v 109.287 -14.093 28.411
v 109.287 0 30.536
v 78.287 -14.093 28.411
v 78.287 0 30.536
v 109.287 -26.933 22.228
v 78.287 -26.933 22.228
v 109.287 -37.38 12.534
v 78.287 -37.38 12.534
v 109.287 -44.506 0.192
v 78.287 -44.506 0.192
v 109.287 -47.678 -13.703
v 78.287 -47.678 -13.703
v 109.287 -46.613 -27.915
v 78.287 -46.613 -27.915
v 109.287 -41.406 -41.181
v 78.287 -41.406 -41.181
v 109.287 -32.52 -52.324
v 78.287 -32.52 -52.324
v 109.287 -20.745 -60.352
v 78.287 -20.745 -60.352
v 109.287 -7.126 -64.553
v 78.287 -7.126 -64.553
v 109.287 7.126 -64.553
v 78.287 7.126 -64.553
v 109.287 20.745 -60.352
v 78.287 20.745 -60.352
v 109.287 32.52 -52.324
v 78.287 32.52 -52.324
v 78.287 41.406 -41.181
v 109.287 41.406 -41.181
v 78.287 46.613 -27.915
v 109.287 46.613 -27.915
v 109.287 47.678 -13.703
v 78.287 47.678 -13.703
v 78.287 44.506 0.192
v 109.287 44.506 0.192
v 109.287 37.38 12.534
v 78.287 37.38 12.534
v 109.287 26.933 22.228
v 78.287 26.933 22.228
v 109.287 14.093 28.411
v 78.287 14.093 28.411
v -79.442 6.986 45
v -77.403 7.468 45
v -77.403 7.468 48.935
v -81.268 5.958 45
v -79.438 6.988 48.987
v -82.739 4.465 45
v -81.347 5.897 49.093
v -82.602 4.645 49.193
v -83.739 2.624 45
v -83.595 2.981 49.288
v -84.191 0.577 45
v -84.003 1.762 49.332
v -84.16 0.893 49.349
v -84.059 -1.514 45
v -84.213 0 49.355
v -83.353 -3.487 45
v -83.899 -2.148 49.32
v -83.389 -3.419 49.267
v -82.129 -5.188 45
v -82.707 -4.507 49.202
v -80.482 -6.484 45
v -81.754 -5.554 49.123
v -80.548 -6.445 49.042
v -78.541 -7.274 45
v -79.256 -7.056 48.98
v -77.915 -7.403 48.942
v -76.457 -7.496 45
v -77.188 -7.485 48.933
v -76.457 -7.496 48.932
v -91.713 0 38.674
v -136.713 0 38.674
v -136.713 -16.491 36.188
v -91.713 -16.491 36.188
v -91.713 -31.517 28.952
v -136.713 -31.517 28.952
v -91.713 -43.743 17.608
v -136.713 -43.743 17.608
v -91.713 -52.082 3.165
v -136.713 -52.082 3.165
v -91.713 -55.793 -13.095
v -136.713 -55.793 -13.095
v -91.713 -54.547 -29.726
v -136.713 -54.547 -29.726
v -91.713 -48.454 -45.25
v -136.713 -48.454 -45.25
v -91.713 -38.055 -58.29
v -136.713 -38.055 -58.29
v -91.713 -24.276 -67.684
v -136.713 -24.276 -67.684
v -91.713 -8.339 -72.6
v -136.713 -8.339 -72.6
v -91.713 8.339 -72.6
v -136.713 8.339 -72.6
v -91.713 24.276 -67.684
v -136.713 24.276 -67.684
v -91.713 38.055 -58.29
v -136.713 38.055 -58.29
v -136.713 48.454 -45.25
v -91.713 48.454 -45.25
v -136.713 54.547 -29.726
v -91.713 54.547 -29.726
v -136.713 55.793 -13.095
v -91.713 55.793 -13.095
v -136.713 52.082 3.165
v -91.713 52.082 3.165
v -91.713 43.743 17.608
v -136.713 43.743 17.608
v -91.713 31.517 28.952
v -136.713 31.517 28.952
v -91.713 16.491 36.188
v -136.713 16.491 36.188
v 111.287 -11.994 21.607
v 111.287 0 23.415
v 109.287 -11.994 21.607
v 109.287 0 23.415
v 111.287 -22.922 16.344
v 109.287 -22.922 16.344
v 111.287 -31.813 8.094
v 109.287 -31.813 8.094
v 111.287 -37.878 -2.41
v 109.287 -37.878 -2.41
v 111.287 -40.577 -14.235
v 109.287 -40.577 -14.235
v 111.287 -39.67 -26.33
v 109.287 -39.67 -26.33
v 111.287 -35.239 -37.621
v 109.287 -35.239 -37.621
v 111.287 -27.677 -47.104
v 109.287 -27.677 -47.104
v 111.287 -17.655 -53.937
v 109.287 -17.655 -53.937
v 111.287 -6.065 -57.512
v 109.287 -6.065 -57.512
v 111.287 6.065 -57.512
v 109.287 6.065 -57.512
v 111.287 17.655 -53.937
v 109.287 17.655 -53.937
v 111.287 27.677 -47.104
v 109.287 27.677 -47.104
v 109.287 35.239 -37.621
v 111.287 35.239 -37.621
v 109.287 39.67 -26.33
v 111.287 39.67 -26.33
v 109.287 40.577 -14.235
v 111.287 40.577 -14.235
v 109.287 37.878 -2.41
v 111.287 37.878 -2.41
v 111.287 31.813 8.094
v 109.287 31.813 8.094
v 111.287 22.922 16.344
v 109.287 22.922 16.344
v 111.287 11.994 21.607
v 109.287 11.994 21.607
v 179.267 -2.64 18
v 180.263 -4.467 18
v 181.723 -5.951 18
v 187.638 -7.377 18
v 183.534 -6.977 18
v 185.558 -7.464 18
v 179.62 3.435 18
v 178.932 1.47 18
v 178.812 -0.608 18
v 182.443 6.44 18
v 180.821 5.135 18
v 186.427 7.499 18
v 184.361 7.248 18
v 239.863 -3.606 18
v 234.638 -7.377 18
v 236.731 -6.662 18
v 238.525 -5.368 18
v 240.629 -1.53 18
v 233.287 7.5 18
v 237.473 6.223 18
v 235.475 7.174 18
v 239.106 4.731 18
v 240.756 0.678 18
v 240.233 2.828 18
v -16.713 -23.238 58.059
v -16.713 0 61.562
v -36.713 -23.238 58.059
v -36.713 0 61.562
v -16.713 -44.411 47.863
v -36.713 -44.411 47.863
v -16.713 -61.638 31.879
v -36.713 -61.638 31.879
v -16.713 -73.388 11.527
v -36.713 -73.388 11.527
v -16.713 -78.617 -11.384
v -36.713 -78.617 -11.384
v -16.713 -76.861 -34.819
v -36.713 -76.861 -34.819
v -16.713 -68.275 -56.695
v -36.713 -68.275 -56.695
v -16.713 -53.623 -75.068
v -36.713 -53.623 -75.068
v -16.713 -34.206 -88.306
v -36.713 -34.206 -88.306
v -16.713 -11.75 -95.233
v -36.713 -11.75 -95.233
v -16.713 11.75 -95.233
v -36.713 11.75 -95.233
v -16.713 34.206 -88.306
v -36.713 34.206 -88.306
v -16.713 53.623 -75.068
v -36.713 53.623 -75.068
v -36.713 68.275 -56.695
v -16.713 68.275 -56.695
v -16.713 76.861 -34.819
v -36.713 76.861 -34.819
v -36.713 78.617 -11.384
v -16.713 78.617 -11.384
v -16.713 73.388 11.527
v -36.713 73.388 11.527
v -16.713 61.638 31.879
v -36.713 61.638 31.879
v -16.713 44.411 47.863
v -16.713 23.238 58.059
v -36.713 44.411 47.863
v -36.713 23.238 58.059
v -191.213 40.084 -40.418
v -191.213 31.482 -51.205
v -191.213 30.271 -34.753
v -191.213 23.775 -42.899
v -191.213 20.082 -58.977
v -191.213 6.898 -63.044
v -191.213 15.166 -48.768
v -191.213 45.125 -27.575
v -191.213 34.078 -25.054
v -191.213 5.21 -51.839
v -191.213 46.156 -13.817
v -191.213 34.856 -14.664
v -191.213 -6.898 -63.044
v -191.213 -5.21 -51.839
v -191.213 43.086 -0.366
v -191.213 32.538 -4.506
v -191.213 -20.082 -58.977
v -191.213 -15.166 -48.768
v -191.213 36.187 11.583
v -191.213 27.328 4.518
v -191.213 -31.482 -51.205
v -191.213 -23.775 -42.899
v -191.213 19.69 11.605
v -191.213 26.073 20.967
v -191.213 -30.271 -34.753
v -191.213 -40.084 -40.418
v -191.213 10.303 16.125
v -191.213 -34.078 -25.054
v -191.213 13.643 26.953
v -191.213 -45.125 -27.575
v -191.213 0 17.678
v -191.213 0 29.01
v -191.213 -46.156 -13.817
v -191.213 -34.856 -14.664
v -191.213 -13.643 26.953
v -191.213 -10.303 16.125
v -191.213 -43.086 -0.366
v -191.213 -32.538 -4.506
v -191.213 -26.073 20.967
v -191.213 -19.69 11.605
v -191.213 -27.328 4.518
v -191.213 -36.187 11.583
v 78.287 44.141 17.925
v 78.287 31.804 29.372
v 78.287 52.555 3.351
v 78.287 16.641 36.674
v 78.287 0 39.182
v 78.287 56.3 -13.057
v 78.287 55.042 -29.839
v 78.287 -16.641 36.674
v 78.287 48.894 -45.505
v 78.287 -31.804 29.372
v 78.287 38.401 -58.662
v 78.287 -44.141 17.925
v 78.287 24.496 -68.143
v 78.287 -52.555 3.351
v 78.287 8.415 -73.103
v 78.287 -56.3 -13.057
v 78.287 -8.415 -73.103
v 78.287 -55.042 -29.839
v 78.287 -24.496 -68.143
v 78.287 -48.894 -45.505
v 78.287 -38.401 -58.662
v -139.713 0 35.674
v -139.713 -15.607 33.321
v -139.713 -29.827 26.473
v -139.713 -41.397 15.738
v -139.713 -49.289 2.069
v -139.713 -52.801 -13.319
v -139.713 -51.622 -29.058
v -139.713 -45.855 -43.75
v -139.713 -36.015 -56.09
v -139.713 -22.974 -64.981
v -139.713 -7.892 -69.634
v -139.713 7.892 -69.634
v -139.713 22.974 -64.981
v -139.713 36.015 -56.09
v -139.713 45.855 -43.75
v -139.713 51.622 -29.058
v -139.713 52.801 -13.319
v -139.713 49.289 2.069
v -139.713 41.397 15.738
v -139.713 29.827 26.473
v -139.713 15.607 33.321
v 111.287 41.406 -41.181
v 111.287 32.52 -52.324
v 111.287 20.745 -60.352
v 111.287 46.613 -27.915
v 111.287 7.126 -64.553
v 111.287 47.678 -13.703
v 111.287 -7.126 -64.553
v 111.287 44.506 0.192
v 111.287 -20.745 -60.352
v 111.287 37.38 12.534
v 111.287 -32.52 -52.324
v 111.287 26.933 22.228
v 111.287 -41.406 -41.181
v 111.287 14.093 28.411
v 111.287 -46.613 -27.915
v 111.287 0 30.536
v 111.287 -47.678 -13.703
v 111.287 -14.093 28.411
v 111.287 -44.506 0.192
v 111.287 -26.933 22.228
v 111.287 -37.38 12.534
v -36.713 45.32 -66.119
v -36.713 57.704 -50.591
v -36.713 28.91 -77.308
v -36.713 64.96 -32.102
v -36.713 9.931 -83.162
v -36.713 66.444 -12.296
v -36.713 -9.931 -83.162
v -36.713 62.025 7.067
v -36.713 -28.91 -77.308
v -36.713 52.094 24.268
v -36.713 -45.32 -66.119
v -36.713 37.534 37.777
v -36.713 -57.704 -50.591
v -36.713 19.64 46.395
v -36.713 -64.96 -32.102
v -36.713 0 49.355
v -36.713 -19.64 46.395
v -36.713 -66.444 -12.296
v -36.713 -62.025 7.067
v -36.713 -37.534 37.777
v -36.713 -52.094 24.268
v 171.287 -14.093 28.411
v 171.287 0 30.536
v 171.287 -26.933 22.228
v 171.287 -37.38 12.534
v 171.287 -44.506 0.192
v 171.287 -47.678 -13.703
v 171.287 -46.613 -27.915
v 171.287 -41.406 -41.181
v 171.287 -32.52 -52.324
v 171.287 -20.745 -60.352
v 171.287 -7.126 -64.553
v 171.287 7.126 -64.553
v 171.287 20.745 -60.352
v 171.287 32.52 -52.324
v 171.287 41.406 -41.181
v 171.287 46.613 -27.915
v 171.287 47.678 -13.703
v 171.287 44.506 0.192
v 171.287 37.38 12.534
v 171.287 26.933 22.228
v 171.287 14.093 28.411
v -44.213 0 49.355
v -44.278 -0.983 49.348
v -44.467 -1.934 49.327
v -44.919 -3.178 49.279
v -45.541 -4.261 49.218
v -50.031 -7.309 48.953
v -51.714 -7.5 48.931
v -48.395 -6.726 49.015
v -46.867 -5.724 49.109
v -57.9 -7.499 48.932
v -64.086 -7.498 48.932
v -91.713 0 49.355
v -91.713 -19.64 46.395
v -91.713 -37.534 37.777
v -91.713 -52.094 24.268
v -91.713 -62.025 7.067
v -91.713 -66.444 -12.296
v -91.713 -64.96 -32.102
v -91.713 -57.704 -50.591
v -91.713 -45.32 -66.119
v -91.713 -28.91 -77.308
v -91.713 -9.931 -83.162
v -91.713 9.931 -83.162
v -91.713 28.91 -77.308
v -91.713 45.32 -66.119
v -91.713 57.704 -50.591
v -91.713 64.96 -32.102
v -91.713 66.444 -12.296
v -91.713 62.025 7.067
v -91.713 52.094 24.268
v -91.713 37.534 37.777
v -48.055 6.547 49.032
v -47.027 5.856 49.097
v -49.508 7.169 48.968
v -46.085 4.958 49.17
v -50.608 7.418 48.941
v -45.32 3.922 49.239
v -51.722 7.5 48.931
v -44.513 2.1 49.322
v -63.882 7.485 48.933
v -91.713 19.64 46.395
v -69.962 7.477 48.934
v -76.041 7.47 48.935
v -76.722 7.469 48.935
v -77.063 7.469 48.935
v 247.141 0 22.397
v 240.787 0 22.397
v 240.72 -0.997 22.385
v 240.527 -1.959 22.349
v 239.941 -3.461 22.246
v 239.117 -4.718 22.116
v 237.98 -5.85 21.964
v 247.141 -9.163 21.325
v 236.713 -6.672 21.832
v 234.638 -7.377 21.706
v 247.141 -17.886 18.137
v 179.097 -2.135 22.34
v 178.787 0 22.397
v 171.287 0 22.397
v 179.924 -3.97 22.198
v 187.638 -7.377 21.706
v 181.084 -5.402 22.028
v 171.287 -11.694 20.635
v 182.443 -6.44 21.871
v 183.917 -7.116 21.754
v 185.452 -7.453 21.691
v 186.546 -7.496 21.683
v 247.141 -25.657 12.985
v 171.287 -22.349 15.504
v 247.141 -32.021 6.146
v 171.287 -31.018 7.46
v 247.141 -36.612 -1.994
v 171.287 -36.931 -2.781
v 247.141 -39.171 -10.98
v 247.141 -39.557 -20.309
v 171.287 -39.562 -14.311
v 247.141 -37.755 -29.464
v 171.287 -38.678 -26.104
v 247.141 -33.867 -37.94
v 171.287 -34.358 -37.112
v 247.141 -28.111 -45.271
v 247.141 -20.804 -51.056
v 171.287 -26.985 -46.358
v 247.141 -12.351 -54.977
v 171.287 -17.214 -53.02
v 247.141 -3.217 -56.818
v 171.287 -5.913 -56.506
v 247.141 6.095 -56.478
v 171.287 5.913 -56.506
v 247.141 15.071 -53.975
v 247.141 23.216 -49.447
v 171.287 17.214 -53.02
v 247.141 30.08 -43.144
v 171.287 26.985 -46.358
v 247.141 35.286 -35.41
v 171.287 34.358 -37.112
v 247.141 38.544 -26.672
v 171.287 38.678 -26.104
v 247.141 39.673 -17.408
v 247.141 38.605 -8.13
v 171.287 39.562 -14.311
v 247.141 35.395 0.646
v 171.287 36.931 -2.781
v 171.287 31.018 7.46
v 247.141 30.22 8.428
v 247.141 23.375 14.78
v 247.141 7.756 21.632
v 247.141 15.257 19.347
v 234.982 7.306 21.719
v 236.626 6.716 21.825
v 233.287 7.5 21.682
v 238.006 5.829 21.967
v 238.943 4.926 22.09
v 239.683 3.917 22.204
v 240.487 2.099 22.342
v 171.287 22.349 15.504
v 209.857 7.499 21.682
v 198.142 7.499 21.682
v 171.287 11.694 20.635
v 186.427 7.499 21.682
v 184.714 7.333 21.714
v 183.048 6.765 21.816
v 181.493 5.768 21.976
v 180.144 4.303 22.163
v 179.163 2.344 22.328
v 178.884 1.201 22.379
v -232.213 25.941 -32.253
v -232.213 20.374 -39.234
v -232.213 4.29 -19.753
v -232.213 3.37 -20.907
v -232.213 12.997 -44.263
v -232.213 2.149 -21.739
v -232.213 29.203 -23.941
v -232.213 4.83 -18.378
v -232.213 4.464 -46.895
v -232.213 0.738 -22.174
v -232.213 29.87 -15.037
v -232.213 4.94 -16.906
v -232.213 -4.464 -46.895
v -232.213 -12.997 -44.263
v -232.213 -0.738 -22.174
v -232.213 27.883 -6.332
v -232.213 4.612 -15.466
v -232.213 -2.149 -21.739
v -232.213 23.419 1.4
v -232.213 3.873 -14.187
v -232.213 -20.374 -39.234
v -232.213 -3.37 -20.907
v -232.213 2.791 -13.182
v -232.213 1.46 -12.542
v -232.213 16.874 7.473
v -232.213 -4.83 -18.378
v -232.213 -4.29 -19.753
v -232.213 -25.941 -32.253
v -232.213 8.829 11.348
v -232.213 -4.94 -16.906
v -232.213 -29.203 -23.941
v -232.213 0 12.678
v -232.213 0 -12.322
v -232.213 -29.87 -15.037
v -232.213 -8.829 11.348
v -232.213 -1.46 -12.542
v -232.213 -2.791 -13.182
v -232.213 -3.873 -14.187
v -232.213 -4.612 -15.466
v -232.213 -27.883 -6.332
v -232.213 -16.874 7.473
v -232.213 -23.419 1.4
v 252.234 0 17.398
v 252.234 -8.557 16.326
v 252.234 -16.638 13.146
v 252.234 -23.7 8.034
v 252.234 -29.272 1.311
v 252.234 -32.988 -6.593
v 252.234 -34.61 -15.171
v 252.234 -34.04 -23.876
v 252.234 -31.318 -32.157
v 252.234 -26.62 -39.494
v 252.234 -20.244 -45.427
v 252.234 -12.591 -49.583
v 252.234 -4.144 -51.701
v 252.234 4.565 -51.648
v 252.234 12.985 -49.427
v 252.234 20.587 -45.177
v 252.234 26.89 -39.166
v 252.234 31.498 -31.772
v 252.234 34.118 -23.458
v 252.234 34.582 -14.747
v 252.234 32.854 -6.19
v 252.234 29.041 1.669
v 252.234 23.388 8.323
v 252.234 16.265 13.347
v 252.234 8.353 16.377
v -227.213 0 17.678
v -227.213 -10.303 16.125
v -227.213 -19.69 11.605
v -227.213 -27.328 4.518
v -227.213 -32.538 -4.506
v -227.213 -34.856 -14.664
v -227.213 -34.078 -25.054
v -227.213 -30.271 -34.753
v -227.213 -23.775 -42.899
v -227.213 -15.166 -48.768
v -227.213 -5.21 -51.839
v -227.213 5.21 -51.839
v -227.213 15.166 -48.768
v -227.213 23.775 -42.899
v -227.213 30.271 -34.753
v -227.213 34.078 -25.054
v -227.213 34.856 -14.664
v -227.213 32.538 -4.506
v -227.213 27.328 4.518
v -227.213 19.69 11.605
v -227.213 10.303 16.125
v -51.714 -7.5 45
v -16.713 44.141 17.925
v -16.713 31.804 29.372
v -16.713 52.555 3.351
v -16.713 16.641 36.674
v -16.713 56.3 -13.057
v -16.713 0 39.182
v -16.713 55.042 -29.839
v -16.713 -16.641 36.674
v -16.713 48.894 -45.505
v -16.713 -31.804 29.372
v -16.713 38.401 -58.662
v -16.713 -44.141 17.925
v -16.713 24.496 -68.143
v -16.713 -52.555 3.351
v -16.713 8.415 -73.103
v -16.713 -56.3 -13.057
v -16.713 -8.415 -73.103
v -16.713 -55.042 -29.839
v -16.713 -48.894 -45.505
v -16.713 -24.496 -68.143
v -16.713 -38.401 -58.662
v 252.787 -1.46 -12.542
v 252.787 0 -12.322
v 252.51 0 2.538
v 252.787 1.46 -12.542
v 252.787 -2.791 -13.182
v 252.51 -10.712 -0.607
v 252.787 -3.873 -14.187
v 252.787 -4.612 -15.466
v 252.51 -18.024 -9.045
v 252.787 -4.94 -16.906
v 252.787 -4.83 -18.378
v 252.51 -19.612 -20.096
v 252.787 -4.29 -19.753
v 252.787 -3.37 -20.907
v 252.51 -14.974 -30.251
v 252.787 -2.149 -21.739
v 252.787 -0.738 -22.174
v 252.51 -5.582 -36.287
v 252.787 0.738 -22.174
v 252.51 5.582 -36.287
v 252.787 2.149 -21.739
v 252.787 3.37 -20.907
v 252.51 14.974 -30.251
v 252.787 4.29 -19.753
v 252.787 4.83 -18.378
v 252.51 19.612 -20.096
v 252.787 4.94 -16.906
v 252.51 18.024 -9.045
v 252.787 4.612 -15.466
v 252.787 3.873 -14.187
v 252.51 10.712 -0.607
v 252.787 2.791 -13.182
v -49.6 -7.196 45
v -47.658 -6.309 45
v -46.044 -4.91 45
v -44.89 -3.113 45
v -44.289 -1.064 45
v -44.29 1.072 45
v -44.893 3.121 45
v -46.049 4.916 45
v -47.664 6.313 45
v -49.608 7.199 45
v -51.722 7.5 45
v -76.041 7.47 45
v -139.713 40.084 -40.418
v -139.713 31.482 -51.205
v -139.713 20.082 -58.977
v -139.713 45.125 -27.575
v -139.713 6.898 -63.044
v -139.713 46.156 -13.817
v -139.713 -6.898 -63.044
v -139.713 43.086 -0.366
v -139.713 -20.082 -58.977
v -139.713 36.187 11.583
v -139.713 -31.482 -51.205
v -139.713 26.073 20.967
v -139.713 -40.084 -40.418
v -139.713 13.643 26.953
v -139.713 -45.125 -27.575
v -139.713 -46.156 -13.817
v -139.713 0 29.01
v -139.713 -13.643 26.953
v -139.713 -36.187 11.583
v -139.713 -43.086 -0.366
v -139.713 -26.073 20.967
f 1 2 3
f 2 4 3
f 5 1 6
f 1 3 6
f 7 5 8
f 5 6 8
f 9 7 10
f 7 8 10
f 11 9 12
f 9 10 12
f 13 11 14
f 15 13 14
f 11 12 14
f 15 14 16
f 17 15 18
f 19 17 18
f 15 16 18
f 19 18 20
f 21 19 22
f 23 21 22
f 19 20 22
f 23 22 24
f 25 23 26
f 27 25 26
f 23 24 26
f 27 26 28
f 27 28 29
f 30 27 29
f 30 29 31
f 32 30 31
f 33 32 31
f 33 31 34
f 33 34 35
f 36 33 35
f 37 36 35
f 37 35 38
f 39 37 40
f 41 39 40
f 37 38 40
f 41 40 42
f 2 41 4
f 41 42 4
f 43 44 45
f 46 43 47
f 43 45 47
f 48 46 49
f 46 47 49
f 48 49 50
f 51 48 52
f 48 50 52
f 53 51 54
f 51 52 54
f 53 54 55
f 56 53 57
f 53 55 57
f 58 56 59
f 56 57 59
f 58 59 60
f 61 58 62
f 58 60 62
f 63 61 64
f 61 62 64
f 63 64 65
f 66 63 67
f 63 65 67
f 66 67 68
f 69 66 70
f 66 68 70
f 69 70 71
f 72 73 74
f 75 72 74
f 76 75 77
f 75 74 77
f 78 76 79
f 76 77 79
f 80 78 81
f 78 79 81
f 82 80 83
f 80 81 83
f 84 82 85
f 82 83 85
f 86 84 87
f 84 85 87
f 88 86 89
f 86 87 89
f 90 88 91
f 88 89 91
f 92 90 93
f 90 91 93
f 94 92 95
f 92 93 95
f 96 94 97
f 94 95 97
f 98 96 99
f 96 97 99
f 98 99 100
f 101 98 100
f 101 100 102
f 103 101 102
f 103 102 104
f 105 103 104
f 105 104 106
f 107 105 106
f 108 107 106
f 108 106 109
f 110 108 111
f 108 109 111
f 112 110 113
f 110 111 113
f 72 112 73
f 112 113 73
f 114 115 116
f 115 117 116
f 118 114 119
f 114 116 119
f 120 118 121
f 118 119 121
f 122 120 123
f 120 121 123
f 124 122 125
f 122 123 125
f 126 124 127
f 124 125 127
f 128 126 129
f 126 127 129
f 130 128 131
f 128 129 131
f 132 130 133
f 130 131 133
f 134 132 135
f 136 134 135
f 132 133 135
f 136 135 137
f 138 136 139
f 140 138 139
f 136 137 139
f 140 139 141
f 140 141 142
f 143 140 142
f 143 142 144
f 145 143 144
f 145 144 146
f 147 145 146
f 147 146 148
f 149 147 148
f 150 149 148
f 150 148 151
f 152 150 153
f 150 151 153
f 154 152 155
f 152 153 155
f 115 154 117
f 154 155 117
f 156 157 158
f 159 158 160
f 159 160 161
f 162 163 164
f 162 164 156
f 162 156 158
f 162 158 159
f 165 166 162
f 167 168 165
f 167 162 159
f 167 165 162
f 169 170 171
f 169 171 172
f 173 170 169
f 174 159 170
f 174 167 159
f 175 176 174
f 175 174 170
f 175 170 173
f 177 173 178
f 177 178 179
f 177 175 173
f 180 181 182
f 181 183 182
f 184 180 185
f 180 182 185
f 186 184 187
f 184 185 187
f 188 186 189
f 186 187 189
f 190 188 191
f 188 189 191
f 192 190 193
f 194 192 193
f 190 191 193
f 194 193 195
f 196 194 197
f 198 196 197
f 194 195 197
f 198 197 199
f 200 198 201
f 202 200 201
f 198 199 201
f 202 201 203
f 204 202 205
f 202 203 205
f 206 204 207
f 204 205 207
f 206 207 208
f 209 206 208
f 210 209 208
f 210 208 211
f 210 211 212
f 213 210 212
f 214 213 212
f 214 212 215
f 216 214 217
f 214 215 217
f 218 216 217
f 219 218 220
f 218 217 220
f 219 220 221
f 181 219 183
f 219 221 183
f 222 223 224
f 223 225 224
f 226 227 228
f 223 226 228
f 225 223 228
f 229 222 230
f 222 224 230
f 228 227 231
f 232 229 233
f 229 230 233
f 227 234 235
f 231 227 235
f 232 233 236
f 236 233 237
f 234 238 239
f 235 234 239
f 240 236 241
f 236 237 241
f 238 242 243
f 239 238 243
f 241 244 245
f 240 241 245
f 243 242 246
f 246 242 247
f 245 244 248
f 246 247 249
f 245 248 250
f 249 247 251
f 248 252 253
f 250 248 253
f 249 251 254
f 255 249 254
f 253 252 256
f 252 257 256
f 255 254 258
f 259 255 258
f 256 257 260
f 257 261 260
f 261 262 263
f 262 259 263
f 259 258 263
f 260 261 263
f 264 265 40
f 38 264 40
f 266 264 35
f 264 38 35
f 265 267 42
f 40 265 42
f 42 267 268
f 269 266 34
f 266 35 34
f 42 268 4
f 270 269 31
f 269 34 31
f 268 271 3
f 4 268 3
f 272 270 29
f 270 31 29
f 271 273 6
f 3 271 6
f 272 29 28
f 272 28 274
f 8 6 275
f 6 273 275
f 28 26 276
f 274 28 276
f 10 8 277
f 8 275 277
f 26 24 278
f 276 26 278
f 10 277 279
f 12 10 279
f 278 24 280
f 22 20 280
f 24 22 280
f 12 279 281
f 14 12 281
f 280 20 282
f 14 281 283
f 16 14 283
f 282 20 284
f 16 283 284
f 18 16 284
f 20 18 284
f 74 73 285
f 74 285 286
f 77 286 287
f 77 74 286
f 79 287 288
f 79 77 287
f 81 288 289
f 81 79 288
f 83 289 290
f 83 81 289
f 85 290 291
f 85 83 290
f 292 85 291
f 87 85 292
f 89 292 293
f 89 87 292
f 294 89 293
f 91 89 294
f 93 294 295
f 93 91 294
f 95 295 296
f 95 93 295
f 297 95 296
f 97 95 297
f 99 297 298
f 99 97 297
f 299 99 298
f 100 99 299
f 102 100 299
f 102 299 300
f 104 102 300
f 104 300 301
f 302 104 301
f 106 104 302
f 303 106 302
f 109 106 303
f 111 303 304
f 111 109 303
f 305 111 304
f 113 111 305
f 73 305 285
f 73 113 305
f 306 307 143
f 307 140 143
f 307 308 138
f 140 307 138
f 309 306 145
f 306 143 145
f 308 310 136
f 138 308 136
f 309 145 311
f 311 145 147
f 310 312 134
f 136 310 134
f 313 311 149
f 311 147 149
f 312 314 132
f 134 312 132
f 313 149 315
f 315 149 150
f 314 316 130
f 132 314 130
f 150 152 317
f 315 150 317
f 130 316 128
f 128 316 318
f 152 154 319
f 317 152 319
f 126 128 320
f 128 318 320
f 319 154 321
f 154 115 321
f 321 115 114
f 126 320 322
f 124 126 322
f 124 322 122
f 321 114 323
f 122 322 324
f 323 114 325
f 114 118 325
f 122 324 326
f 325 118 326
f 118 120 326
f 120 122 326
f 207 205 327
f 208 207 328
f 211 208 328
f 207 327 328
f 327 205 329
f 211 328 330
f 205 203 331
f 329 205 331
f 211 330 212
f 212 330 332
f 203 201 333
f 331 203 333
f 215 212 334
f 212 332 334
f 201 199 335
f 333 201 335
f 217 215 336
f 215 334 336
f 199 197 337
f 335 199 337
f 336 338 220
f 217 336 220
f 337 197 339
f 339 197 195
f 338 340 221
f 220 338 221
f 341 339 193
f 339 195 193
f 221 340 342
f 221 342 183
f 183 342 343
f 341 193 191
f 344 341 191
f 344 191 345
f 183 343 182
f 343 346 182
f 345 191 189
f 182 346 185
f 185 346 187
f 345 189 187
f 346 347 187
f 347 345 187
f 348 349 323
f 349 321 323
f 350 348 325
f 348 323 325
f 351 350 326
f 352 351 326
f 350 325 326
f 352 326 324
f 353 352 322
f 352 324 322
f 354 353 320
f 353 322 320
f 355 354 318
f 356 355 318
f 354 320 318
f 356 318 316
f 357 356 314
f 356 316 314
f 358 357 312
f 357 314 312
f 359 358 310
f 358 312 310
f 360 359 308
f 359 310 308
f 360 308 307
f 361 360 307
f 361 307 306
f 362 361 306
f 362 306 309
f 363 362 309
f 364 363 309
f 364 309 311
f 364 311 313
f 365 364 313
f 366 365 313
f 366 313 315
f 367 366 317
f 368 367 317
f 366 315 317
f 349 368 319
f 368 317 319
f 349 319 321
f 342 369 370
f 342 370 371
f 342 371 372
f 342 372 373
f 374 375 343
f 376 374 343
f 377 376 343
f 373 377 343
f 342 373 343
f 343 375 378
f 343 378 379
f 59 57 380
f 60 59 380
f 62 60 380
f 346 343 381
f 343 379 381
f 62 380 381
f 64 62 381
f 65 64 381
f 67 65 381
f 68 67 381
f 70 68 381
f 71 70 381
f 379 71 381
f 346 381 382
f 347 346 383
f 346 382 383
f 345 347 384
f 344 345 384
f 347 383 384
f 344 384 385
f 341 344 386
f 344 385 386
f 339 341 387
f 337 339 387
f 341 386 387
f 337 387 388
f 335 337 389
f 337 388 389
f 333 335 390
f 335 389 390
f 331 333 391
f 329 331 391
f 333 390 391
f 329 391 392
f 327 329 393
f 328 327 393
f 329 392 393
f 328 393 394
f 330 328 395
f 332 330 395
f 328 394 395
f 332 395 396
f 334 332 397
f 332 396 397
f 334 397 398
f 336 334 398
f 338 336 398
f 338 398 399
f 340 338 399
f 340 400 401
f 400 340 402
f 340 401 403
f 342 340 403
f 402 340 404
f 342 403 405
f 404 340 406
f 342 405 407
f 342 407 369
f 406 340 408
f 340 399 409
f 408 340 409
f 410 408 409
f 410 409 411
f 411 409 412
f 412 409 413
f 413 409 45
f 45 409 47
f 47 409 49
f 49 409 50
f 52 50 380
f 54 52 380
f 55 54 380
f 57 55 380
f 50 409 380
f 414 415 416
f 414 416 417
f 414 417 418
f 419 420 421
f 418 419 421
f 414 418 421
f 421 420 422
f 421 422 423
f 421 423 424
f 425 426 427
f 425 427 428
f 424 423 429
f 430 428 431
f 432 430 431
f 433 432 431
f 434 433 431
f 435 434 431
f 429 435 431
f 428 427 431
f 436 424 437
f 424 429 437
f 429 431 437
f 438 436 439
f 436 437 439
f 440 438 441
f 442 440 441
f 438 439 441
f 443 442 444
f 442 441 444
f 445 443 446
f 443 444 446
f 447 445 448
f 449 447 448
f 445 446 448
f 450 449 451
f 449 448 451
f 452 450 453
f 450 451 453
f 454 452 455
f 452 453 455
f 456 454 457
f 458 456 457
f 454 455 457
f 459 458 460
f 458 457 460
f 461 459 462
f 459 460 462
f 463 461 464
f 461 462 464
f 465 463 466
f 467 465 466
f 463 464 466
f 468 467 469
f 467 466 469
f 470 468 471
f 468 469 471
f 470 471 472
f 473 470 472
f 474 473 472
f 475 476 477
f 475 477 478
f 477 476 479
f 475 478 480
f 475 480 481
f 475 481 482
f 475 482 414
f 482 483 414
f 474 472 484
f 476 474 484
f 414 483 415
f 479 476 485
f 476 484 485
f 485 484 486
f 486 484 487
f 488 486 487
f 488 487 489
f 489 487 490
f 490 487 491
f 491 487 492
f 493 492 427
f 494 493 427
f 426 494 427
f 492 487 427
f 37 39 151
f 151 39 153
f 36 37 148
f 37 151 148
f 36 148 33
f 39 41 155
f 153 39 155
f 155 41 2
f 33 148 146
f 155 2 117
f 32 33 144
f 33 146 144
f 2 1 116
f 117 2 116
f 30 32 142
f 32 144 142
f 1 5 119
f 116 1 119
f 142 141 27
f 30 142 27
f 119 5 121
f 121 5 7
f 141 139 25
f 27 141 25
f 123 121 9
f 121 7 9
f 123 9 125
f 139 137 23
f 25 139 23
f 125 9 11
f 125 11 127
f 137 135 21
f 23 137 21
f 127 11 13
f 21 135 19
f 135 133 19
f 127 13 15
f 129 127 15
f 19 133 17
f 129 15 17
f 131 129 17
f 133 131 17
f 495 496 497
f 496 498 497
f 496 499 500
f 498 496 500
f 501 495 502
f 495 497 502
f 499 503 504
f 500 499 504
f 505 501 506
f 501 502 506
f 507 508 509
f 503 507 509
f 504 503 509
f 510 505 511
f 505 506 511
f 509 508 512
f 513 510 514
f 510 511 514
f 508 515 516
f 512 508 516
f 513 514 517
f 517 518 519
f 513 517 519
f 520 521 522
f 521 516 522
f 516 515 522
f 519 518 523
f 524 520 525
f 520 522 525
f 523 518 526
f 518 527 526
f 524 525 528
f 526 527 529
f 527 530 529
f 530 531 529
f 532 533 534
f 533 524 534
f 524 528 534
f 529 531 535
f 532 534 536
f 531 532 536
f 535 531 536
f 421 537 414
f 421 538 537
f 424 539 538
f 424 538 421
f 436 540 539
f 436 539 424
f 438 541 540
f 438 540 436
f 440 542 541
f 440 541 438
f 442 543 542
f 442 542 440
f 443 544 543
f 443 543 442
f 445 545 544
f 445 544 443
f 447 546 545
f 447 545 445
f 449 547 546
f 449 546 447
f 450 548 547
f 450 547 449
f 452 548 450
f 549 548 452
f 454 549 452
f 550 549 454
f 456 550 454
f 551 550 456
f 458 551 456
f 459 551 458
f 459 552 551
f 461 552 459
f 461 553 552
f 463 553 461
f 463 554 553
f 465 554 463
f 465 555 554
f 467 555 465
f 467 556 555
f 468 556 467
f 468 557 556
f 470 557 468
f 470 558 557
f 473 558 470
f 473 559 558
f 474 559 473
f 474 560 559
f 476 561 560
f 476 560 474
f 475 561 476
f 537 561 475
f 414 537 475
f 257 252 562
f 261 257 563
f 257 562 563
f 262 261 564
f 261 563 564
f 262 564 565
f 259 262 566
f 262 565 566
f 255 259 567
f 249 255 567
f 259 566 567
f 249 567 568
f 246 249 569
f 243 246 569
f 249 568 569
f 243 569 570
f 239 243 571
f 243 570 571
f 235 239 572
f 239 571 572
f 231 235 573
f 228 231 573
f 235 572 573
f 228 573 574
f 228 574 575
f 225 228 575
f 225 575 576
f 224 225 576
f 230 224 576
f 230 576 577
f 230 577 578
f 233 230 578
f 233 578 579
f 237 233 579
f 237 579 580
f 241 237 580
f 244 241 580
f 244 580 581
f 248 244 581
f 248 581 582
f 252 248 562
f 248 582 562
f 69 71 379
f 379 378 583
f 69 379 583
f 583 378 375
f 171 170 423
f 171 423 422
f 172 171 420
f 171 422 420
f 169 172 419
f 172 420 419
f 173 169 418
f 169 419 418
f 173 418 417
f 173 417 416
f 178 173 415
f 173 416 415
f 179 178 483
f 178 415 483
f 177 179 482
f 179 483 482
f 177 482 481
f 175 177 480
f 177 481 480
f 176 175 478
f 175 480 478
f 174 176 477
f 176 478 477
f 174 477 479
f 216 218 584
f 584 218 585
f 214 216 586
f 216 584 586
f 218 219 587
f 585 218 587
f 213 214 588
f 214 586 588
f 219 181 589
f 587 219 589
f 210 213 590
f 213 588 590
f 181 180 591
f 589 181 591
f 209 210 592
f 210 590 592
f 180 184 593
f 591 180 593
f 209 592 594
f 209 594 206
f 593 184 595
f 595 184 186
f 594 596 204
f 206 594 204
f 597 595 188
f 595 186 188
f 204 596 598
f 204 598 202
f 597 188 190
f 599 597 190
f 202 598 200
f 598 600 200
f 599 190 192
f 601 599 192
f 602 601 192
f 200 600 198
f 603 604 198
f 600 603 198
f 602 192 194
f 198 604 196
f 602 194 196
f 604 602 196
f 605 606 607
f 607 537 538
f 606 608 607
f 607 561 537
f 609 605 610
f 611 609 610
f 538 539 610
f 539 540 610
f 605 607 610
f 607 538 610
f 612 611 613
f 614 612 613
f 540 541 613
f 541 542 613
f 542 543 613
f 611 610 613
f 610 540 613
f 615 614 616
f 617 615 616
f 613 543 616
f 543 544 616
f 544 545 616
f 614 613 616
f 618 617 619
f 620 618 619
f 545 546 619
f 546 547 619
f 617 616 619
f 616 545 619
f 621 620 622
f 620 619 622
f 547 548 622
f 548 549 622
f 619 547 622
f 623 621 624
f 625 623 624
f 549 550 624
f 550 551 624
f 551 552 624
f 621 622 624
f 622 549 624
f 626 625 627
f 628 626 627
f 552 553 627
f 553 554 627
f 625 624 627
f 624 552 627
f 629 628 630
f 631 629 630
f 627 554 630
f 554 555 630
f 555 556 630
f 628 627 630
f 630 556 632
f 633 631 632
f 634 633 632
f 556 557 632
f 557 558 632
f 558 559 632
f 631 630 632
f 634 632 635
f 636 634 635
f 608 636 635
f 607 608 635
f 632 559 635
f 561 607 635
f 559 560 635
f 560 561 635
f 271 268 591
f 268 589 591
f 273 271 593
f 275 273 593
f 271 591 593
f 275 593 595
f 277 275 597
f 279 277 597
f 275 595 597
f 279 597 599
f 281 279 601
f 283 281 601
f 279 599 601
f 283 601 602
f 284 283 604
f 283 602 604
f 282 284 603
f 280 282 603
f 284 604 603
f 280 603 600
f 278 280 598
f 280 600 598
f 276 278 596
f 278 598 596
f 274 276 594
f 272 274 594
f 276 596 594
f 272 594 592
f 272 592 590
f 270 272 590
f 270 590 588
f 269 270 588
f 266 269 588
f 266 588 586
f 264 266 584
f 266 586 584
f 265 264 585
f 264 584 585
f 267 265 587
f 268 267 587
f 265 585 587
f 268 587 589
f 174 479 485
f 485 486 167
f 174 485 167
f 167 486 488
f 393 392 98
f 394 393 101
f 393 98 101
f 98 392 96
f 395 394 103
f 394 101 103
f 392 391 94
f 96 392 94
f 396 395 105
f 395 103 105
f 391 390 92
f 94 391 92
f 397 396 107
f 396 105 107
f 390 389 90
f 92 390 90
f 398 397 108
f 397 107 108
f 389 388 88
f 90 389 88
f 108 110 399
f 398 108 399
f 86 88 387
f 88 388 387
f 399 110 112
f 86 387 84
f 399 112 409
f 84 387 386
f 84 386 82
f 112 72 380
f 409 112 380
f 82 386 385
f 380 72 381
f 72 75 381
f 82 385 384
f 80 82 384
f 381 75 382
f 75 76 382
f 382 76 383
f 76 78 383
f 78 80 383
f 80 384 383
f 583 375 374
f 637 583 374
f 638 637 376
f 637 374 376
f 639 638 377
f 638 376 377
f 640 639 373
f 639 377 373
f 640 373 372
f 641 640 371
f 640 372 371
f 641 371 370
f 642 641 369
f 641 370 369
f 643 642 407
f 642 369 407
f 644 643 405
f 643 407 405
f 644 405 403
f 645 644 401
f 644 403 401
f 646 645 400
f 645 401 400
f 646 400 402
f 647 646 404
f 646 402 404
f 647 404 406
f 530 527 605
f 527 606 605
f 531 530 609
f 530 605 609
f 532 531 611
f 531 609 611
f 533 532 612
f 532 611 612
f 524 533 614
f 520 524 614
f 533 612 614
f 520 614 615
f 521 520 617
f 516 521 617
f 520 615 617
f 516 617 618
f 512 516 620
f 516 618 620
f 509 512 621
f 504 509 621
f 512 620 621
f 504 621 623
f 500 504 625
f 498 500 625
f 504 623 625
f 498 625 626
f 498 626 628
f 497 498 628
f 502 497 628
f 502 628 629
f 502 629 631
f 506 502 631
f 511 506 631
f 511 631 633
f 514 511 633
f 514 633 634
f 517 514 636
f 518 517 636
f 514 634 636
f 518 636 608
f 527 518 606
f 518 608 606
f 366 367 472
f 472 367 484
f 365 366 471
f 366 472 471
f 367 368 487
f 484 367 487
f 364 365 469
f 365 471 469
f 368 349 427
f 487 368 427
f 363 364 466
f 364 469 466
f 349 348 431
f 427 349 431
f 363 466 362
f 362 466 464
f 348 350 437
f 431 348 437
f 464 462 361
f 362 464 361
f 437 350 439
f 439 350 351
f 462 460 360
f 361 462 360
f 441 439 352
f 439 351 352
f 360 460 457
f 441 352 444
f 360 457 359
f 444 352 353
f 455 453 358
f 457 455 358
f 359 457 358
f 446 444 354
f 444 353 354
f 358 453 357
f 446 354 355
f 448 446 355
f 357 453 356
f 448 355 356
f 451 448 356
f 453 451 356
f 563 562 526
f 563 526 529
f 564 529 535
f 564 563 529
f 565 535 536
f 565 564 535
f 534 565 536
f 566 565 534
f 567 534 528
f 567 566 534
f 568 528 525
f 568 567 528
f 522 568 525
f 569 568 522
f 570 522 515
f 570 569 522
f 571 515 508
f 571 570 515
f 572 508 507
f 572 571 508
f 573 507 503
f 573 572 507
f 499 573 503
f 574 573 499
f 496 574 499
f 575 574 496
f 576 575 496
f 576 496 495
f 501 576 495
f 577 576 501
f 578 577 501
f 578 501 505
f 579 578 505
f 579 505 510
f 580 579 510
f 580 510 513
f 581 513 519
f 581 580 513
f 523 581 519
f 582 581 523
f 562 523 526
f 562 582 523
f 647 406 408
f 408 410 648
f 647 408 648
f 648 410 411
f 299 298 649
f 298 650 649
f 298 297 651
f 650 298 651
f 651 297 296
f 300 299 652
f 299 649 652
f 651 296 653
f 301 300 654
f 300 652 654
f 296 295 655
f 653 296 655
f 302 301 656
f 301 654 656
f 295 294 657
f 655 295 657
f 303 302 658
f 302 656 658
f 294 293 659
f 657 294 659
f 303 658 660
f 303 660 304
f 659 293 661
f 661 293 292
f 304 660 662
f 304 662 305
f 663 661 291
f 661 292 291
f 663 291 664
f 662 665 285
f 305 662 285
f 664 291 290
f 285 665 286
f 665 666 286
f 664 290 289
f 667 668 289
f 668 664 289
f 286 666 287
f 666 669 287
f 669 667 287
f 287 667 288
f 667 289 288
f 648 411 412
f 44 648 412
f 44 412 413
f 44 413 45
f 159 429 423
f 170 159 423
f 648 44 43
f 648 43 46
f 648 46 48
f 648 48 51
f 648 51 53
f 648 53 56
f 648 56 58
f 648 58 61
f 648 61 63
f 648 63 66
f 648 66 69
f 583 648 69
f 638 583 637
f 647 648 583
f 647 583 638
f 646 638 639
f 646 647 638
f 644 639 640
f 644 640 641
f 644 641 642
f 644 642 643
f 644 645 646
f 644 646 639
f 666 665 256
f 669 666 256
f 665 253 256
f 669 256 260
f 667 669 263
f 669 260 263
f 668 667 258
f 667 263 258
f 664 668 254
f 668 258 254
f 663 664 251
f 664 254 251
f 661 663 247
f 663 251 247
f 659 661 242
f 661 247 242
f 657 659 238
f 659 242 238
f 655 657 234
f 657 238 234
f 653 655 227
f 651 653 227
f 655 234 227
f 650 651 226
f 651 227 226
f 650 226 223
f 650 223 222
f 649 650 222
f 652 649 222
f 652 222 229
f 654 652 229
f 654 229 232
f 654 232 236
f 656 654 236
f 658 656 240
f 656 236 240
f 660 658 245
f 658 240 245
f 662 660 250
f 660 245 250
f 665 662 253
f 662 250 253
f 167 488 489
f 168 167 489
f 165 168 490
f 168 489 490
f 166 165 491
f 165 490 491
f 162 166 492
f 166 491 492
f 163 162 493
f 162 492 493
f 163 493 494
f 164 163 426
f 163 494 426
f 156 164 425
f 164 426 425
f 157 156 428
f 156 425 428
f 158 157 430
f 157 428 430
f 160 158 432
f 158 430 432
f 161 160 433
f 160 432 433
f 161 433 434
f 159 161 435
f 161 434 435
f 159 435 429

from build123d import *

# Parameters (mm, degrees)
F2_SIZE  = 5
F3_SIZE  = 5
F4_SIZE  = 3
F7_DEPTH = 32
F9_DEPTH = 5


with BuildPart() as f1:
    # F0 (on Front) → F1 (revolve)
    with BuildSketch(Plane.XZ):
        Polygon((-232.2130019963, 17.678354606), (-232.2130019963, -12.321645394), (252.7869980037, -12.321645394), (252.1408498287, 22.3974585533), (171.2869980037, 22.3974585533), (171.2869980037, 30.5355489254), (111.2869980037, 30.5355489254), (111.2869980037, 23.4147198498), (109.2869980037, 23.4147198498), (109.2869980037, 30.5355489254), (78.2869980037, 30.5355489254), (78.2869980037, 39.1822680831), (-16.7130019963, 39.1822680831), (-16.7130019963, 61.5620166063), (-36.7130019963, 61.5620166063), (-36.7130019963, 49.3548810482), (-91.7130019963, 49.3548810482), (-91.7130019963, 38.6736355722), (-139.7130019963, 38.6736355722), (-139.7130019963, 29.0096569806), (-191.2130019963, 29.0096569806), (-191.2130019963, 17.678354606), align=None)
    revolve(axis=Axis((10.0326761603, 0, -17.275730148), (1, 0, 0)))

    # F2
    f2_edges = [f1.edges().sort_by_distance(p)[0] for p in [
        (-232.213002, 0, -52.229815),
    ]]
    chamfer(f2_edges, length=F2_SIZE)

    # F3
    f3_edges = [f1.edges().sort_by_distance(p)[0] for p in [
        (252.14085, 0, -56.948919),
    ]]
    chamfer(f3_edges, length=F3_SIZE)

    # F4
    f4_edges = [f1.edges().sort_by_distance(p)[0] for p in [
        (-139.713002, 0, -73.225096),
    ]]
    chamfer(f4_edges, length=F4_SIZE)

    # F6 (on offset) → F7 (cut)
    with BuildSketch(Plane.XY.offset(50)):
        with BuildLine():
            Line((233.2867880477, 7.4999999971), (186.4272663162, 7.4986882053))
            ThreePointArc((186.4272663162, 7.4986882053), (178.8117069281, -0.608295434), (187.6377915852, -7.3773543158))
            Line((187.6377915852, -7.3773543158), (231.9362044222, -7.3773543158))
            Line((231.9362044222, -7.3773543158), (234.6377915852, -7.3773543158))
            ThreePointArc((234.6377915852, -7.3773543158), (240.7562641571, 0.6782795371), (233.2867880477, 7.4999999971))
        make_face()
    extrude(amount=-F7_DEPTH, mode=Mode.SUBTRACT)

    # F8 (on offset) → F9 (cut)
    with BuildSketch(Plane.XY.offset(50)):
        with BuildLine():
            Line((-76.4573437408, -7.4956413239), (-51.7143231445, -7.4999998836))
            ThreePointArc((-51.7143231445, -7.4999998836), (-44.2130030543, 0.003983777), (-51.7222906966, 7.499994248))
            Line((-51.7222906966, 7.499994248), (-76.0414618998, 7.4698750926))
            Line((-76.0414618998, 7.4698750926), (-77.4030428, 7.4681887824))
            ThreePointArc((-77.4030428, 7.4681887824), (-84.1980687904, -0.4730487165), (-76.4573437408, -7.4956413239))
        make_face()
    extrude(amount=-F9_DEPTH, mode=Mode.SUBTRACT)


solid = f1.part
